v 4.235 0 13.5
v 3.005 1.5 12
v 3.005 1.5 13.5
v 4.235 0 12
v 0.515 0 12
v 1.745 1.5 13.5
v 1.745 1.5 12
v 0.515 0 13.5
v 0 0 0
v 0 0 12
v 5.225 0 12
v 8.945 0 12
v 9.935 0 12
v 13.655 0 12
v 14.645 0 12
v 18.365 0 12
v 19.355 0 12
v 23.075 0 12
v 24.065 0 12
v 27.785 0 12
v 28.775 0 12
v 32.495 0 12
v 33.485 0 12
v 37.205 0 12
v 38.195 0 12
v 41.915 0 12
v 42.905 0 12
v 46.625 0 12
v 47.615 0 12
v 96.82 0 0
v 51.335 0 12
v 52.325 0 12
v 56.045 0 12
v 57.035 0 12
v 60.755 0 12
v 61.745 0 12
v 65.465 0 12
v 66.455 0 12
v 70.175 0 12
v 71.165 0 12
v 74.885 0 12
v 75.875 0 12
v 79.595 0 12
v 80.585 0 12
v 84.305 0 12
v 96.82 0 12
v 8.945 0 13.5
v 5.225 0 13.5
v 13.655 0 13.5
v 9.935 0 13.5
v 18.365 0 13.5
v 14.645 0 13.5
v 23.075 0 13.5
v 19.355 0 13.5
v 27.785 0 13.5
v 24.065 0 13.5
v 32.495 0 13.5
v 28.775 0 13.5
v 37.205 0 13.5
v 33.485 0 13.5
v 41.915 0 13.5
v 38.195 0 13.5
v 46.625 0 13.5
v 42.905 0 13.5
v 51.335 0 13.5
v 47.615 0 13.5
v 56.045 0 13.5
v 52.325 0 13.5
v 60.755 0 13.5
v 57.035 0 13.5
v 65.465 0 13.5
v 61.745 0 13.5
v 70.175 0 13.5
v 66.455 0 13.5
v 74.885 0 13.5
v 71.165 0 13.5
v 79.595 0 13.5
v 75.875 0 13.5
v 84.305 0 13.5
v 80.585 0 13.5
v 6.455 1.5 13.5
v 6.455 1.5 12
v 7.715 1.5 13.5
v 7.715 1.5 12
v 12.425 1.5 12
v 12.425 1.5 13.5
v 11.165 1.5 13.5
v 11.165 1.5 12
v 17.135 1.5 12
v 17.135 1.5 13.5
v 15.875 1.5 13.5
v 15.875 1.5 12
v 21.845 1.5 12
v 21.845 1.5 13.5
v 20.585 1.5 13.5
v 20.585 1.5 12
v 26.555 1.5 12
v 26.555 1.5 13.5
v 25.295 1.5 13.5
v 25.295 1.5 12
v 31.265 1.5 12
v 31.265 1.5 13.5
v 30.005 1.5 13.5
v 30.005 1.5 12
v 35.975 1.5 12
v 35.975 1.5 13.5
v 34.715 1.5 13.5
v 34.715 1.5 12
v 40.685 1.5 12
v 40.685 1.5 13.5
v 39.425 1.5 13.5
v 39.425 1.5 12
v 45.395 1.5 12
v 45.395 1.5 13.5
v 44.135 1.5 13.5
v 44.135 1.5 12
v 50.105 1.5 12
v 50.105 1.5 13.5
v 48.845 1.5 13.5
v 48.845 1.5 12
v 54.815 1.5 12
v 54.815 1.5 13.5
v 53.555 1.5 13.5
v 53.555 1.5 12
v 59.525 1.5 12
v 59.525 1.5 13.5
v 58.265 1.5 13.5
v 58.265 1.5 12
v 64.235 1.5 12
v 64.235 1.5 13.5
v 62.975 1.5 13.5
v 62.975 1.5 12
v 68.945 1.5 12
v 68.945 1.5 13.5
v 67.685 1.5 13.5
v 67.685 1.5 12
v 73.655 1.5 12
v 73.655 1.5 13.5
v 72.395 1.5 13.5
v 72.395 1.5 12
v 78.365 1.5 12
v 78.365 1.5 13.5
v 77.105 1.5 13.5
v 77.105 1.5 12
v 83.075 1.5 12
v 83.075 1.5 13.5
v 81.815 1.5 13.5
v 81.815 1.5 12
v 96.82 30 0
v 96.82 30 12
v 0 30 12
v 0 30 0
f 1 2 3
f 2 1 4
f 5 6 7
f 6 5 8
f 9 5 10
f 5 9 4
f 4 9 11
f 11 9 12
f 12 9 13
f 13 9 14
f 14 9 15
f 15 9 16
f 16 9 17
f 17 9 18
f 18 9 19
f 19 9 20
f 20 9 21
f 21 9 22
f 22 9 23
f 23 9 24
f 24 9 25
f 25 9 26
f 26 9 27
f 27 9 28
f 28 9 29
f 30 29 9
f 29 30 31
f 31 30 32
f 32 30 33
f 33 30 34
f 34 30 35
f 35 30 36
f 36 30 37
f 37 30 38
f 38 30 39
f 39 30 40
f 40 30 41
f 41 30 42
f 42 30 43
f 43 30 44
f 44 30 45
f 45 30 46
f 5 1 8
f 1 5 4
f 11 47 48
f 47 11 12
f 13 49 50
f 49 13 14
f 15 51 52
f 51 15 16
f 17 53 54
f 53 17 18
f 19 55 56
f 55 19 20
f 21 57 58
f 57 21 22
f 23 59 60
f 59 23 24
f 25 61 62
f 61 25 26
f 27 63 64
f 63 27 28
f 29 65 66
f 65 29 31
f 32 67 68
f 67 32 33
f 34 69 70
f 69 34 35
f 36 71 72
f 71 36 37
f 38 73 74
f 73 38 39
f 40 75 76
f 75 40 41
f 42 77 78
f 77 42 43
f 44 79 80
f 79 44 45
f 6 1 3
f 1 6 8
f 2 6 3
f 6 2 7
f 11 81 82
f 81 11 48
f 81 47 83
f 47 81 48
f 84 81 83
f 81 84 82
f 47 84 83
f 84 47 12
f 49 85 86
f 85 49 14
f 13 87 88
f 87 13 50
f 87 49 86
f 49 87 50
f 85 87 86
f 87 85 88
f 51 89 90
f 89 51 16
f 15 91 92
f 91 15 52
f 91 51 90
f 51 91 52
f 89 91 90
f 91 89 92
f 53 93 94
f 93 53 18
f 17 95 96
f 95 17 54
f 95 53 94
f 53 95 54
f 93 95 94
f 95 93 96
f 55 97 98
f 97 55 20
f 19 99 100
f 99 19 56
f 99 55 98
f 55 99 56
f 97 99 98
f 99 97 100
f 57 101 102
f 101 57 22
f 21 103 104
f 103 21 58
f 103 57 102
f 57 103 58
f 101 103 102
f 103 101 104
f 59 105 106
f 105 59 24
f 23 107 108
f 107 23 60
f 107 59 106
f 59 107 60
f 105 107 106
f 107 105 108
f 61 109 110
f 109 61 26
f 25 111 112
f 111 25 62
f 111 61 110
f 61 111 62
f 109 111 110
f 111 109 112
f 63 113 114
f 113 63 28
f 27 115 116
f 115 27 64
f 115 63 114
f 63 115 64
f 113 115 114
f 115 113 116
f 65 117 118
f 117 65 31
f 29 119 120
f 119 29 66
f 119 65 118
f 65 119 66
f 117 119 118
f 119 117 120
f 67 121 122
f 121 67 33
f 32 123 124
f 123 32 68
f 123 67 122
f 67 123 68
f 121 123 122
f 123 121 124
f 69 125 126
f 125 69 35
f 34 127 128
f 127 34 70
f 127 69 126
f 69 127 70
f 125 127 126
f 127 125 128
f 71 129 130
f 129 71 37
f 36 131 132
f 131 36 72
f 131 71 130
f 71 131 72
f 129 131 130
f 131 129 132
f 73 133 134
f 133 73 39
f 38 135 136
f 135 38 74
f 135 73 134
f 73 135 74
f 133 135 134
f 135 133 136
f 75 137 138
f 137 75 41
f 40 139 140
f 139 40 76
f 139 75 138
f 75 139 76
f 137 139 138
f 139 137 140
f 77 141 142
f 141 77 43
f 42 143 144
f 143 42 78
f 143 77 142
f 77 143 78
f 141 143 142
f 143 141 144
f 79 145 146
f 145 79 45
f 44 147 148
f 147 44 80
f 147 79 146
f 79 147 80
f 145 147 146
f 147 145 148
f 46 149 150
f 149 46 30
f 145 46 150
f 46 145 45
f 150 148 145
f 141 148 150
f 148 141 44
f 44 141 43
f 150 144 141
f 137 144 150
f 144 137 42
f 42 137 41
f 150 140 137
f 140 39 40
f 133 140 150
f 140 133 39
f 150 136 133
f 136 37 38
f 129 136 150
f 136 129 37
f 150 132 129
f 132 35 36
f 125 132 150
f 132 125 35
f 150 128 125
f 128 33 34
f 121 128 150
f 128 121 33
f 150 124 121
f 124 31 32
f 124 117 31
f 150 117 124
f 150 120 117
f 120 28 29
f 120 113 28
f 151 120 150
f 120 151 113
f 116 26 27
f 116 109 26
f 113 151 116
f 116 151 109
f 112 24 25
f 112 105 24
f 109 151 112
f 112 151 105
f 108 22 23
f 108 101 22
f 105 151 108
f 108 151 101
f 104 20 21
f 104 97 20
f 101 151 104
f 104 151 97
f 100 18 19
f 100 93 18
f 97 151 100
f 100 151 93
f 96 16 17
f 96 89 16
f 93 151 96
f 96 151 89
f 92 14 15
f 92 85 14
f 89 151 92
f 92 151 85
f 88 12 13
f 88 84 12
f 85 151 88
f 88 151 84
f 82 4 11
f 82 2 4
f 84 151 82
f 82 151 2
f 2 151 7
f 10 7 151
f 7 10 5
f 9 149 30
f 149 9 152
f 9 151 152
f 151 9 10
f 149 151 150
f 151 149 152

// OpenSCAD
$fn = 32;

// ----------------------------------------------------------------------
// Gear rack: m=1.5 z=18, 96.82 x 30 x 13.5 mm
// ----------------------------------------------------------------------

// --- parameters (mm) ---
bar_len = 96.82;          // rack length, X
bar_w = 30;               // rack width, Y
bar_h = 13.5;             // overall height, Z
gear_module = 1.5;        // module
base_t = 12;              // tooth root line height
pitch = 4.71;             // circular pitch
tip_w = 1.26;             // tooth thickness at the tip
root_w = 3.72;            // tooth thickness at the root line
sink = 0.6;               // tooth root overlap into the body

tooth_span = 84.82;

module tooth(x0) {
  /* 20 deg flank profile, sunk into the body for a positive overlap */
  translate([x0, 0, base_t - sink])
    linear_extrude(height = bar_h - base_t + sink)
      polygon(points = [[-root_w / 2, 0], [root_w / 2, 0],
                        [tip_w / 2, bar_h - base_t],
                        [-tip_w / 2, bar_h - base_t]]);
}

difference() {
  union() {
    cube([bar_len, bar_w, base_t]);
    for (i = [0 : 18 - 1])
      tooth((i + 0.5) * pitch + (tooth_span - 18 * pitch) / 2);
  }
}
